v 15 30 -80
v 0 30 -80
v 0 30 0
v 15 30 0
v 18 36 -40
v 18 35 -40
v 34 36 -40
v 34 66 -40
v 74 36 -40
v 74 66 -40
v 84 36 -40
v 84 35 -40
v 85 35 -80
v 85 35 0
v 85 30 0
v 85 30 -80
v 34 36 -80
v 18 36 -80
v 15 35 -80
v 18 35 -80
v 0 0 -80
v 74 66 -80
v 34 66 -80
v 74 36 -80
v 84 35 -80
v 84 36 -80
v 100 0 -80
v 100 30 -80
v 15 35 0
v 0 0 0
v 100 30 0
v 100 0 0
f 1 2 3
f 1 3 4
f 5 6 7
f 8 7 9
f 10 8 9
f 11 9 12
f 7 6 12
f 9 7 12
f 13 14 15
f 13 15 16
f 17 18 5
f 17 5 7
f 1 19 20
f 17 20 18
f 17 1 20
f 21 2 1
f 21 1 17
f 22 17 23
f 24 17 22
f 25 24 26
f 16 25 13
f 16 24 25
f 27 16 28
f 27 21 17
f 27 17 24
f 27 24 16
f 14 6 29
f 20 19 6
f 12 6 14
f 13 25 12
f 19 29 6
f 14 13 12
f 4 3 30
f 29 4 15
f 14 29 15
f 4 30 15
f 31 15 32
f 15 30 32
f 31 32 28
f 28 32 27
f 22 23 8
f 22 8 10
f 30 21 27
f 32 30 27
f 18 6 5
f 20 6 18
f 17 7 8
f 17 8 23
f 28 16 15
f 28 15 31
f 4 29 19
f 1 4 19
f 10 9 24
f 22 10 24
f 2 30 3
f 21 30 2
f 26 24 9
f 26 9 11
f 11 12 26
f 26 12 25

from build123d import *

# Parameters (mm, degrees)
SKETCH_1_W          = 100
SKETCH_1_H          = 80
EXTRUDE_1_DEPTH     = 35
SKETCH_2_W          = 66
SKETCH_2_H          = 40
EXTRUDE_2_DEPTH     = 1
SKETCH_3_W          = 40
SKETCH_3_H          = 40
EXTRUDE_3_DEPTH     = 30
SKETCH_4_W          = 15
SKETCH_4_H          = 80
CUT_EXTRUDE_1_DEPTH = 5


with BuildPart() as part:
    # 草图1 → 凸台-拉伸1 (new body)
    with BuildSketch(Plane(origin=(0, 0, 0), x_dir=(1, 0, 0), z_dir=(0, 1, 0))):
        with Locations((50, 40)):
            Rectangle(SKETCH_1_W, SKETCH_1_H)
    extrude(amount=EXTRUDE_1_DEPTH)

    # 草图2 → 凸台-拉伸2 (add)
    with BuildSketch(Plane(origin=(0, 35, 0), x_dir=(1, 0, 0), z_dir=(0, 1, 0))):
        with Locations((51, 60)):
            Rectangle(SKETCH_2_W, SKETCH_2_H)
    extrude(amount=EXTRUDE_2_DEPTH)

    # 草图3 → 凸台-拉伸3 (add)
    with BuildSketch(Plane(origin=(0, 36, 0), x_dir=(1, 0, 0), z_dir=(0, 1, 0))):
        with Locations((54, 60)):
            Rectangle(SKETCH_3_W, SKETCH_3_H)
    extrude(amount=EXTRUDE_3_DEPTH)

    # 草图4 → 切除-拉伸1 (cut)
    with BuildSketch(Plane(origin=(0, 35, 0), x_dir=(1, 0, 0), z_dir=(0, 1, 0))):
        with Locations((7.5, 40)):
            Rectangle(SKETCH_4_W, SKETCH_4_H)
        with Locations((92.5, 40)):
            Rectangle(SKETCH_4_W, SKETCH_4_H)
    extrude(amount=-CUT_EXTRUDE_1_DEPTH, mode=Mode.SUBTRACT)


solid = part.part
